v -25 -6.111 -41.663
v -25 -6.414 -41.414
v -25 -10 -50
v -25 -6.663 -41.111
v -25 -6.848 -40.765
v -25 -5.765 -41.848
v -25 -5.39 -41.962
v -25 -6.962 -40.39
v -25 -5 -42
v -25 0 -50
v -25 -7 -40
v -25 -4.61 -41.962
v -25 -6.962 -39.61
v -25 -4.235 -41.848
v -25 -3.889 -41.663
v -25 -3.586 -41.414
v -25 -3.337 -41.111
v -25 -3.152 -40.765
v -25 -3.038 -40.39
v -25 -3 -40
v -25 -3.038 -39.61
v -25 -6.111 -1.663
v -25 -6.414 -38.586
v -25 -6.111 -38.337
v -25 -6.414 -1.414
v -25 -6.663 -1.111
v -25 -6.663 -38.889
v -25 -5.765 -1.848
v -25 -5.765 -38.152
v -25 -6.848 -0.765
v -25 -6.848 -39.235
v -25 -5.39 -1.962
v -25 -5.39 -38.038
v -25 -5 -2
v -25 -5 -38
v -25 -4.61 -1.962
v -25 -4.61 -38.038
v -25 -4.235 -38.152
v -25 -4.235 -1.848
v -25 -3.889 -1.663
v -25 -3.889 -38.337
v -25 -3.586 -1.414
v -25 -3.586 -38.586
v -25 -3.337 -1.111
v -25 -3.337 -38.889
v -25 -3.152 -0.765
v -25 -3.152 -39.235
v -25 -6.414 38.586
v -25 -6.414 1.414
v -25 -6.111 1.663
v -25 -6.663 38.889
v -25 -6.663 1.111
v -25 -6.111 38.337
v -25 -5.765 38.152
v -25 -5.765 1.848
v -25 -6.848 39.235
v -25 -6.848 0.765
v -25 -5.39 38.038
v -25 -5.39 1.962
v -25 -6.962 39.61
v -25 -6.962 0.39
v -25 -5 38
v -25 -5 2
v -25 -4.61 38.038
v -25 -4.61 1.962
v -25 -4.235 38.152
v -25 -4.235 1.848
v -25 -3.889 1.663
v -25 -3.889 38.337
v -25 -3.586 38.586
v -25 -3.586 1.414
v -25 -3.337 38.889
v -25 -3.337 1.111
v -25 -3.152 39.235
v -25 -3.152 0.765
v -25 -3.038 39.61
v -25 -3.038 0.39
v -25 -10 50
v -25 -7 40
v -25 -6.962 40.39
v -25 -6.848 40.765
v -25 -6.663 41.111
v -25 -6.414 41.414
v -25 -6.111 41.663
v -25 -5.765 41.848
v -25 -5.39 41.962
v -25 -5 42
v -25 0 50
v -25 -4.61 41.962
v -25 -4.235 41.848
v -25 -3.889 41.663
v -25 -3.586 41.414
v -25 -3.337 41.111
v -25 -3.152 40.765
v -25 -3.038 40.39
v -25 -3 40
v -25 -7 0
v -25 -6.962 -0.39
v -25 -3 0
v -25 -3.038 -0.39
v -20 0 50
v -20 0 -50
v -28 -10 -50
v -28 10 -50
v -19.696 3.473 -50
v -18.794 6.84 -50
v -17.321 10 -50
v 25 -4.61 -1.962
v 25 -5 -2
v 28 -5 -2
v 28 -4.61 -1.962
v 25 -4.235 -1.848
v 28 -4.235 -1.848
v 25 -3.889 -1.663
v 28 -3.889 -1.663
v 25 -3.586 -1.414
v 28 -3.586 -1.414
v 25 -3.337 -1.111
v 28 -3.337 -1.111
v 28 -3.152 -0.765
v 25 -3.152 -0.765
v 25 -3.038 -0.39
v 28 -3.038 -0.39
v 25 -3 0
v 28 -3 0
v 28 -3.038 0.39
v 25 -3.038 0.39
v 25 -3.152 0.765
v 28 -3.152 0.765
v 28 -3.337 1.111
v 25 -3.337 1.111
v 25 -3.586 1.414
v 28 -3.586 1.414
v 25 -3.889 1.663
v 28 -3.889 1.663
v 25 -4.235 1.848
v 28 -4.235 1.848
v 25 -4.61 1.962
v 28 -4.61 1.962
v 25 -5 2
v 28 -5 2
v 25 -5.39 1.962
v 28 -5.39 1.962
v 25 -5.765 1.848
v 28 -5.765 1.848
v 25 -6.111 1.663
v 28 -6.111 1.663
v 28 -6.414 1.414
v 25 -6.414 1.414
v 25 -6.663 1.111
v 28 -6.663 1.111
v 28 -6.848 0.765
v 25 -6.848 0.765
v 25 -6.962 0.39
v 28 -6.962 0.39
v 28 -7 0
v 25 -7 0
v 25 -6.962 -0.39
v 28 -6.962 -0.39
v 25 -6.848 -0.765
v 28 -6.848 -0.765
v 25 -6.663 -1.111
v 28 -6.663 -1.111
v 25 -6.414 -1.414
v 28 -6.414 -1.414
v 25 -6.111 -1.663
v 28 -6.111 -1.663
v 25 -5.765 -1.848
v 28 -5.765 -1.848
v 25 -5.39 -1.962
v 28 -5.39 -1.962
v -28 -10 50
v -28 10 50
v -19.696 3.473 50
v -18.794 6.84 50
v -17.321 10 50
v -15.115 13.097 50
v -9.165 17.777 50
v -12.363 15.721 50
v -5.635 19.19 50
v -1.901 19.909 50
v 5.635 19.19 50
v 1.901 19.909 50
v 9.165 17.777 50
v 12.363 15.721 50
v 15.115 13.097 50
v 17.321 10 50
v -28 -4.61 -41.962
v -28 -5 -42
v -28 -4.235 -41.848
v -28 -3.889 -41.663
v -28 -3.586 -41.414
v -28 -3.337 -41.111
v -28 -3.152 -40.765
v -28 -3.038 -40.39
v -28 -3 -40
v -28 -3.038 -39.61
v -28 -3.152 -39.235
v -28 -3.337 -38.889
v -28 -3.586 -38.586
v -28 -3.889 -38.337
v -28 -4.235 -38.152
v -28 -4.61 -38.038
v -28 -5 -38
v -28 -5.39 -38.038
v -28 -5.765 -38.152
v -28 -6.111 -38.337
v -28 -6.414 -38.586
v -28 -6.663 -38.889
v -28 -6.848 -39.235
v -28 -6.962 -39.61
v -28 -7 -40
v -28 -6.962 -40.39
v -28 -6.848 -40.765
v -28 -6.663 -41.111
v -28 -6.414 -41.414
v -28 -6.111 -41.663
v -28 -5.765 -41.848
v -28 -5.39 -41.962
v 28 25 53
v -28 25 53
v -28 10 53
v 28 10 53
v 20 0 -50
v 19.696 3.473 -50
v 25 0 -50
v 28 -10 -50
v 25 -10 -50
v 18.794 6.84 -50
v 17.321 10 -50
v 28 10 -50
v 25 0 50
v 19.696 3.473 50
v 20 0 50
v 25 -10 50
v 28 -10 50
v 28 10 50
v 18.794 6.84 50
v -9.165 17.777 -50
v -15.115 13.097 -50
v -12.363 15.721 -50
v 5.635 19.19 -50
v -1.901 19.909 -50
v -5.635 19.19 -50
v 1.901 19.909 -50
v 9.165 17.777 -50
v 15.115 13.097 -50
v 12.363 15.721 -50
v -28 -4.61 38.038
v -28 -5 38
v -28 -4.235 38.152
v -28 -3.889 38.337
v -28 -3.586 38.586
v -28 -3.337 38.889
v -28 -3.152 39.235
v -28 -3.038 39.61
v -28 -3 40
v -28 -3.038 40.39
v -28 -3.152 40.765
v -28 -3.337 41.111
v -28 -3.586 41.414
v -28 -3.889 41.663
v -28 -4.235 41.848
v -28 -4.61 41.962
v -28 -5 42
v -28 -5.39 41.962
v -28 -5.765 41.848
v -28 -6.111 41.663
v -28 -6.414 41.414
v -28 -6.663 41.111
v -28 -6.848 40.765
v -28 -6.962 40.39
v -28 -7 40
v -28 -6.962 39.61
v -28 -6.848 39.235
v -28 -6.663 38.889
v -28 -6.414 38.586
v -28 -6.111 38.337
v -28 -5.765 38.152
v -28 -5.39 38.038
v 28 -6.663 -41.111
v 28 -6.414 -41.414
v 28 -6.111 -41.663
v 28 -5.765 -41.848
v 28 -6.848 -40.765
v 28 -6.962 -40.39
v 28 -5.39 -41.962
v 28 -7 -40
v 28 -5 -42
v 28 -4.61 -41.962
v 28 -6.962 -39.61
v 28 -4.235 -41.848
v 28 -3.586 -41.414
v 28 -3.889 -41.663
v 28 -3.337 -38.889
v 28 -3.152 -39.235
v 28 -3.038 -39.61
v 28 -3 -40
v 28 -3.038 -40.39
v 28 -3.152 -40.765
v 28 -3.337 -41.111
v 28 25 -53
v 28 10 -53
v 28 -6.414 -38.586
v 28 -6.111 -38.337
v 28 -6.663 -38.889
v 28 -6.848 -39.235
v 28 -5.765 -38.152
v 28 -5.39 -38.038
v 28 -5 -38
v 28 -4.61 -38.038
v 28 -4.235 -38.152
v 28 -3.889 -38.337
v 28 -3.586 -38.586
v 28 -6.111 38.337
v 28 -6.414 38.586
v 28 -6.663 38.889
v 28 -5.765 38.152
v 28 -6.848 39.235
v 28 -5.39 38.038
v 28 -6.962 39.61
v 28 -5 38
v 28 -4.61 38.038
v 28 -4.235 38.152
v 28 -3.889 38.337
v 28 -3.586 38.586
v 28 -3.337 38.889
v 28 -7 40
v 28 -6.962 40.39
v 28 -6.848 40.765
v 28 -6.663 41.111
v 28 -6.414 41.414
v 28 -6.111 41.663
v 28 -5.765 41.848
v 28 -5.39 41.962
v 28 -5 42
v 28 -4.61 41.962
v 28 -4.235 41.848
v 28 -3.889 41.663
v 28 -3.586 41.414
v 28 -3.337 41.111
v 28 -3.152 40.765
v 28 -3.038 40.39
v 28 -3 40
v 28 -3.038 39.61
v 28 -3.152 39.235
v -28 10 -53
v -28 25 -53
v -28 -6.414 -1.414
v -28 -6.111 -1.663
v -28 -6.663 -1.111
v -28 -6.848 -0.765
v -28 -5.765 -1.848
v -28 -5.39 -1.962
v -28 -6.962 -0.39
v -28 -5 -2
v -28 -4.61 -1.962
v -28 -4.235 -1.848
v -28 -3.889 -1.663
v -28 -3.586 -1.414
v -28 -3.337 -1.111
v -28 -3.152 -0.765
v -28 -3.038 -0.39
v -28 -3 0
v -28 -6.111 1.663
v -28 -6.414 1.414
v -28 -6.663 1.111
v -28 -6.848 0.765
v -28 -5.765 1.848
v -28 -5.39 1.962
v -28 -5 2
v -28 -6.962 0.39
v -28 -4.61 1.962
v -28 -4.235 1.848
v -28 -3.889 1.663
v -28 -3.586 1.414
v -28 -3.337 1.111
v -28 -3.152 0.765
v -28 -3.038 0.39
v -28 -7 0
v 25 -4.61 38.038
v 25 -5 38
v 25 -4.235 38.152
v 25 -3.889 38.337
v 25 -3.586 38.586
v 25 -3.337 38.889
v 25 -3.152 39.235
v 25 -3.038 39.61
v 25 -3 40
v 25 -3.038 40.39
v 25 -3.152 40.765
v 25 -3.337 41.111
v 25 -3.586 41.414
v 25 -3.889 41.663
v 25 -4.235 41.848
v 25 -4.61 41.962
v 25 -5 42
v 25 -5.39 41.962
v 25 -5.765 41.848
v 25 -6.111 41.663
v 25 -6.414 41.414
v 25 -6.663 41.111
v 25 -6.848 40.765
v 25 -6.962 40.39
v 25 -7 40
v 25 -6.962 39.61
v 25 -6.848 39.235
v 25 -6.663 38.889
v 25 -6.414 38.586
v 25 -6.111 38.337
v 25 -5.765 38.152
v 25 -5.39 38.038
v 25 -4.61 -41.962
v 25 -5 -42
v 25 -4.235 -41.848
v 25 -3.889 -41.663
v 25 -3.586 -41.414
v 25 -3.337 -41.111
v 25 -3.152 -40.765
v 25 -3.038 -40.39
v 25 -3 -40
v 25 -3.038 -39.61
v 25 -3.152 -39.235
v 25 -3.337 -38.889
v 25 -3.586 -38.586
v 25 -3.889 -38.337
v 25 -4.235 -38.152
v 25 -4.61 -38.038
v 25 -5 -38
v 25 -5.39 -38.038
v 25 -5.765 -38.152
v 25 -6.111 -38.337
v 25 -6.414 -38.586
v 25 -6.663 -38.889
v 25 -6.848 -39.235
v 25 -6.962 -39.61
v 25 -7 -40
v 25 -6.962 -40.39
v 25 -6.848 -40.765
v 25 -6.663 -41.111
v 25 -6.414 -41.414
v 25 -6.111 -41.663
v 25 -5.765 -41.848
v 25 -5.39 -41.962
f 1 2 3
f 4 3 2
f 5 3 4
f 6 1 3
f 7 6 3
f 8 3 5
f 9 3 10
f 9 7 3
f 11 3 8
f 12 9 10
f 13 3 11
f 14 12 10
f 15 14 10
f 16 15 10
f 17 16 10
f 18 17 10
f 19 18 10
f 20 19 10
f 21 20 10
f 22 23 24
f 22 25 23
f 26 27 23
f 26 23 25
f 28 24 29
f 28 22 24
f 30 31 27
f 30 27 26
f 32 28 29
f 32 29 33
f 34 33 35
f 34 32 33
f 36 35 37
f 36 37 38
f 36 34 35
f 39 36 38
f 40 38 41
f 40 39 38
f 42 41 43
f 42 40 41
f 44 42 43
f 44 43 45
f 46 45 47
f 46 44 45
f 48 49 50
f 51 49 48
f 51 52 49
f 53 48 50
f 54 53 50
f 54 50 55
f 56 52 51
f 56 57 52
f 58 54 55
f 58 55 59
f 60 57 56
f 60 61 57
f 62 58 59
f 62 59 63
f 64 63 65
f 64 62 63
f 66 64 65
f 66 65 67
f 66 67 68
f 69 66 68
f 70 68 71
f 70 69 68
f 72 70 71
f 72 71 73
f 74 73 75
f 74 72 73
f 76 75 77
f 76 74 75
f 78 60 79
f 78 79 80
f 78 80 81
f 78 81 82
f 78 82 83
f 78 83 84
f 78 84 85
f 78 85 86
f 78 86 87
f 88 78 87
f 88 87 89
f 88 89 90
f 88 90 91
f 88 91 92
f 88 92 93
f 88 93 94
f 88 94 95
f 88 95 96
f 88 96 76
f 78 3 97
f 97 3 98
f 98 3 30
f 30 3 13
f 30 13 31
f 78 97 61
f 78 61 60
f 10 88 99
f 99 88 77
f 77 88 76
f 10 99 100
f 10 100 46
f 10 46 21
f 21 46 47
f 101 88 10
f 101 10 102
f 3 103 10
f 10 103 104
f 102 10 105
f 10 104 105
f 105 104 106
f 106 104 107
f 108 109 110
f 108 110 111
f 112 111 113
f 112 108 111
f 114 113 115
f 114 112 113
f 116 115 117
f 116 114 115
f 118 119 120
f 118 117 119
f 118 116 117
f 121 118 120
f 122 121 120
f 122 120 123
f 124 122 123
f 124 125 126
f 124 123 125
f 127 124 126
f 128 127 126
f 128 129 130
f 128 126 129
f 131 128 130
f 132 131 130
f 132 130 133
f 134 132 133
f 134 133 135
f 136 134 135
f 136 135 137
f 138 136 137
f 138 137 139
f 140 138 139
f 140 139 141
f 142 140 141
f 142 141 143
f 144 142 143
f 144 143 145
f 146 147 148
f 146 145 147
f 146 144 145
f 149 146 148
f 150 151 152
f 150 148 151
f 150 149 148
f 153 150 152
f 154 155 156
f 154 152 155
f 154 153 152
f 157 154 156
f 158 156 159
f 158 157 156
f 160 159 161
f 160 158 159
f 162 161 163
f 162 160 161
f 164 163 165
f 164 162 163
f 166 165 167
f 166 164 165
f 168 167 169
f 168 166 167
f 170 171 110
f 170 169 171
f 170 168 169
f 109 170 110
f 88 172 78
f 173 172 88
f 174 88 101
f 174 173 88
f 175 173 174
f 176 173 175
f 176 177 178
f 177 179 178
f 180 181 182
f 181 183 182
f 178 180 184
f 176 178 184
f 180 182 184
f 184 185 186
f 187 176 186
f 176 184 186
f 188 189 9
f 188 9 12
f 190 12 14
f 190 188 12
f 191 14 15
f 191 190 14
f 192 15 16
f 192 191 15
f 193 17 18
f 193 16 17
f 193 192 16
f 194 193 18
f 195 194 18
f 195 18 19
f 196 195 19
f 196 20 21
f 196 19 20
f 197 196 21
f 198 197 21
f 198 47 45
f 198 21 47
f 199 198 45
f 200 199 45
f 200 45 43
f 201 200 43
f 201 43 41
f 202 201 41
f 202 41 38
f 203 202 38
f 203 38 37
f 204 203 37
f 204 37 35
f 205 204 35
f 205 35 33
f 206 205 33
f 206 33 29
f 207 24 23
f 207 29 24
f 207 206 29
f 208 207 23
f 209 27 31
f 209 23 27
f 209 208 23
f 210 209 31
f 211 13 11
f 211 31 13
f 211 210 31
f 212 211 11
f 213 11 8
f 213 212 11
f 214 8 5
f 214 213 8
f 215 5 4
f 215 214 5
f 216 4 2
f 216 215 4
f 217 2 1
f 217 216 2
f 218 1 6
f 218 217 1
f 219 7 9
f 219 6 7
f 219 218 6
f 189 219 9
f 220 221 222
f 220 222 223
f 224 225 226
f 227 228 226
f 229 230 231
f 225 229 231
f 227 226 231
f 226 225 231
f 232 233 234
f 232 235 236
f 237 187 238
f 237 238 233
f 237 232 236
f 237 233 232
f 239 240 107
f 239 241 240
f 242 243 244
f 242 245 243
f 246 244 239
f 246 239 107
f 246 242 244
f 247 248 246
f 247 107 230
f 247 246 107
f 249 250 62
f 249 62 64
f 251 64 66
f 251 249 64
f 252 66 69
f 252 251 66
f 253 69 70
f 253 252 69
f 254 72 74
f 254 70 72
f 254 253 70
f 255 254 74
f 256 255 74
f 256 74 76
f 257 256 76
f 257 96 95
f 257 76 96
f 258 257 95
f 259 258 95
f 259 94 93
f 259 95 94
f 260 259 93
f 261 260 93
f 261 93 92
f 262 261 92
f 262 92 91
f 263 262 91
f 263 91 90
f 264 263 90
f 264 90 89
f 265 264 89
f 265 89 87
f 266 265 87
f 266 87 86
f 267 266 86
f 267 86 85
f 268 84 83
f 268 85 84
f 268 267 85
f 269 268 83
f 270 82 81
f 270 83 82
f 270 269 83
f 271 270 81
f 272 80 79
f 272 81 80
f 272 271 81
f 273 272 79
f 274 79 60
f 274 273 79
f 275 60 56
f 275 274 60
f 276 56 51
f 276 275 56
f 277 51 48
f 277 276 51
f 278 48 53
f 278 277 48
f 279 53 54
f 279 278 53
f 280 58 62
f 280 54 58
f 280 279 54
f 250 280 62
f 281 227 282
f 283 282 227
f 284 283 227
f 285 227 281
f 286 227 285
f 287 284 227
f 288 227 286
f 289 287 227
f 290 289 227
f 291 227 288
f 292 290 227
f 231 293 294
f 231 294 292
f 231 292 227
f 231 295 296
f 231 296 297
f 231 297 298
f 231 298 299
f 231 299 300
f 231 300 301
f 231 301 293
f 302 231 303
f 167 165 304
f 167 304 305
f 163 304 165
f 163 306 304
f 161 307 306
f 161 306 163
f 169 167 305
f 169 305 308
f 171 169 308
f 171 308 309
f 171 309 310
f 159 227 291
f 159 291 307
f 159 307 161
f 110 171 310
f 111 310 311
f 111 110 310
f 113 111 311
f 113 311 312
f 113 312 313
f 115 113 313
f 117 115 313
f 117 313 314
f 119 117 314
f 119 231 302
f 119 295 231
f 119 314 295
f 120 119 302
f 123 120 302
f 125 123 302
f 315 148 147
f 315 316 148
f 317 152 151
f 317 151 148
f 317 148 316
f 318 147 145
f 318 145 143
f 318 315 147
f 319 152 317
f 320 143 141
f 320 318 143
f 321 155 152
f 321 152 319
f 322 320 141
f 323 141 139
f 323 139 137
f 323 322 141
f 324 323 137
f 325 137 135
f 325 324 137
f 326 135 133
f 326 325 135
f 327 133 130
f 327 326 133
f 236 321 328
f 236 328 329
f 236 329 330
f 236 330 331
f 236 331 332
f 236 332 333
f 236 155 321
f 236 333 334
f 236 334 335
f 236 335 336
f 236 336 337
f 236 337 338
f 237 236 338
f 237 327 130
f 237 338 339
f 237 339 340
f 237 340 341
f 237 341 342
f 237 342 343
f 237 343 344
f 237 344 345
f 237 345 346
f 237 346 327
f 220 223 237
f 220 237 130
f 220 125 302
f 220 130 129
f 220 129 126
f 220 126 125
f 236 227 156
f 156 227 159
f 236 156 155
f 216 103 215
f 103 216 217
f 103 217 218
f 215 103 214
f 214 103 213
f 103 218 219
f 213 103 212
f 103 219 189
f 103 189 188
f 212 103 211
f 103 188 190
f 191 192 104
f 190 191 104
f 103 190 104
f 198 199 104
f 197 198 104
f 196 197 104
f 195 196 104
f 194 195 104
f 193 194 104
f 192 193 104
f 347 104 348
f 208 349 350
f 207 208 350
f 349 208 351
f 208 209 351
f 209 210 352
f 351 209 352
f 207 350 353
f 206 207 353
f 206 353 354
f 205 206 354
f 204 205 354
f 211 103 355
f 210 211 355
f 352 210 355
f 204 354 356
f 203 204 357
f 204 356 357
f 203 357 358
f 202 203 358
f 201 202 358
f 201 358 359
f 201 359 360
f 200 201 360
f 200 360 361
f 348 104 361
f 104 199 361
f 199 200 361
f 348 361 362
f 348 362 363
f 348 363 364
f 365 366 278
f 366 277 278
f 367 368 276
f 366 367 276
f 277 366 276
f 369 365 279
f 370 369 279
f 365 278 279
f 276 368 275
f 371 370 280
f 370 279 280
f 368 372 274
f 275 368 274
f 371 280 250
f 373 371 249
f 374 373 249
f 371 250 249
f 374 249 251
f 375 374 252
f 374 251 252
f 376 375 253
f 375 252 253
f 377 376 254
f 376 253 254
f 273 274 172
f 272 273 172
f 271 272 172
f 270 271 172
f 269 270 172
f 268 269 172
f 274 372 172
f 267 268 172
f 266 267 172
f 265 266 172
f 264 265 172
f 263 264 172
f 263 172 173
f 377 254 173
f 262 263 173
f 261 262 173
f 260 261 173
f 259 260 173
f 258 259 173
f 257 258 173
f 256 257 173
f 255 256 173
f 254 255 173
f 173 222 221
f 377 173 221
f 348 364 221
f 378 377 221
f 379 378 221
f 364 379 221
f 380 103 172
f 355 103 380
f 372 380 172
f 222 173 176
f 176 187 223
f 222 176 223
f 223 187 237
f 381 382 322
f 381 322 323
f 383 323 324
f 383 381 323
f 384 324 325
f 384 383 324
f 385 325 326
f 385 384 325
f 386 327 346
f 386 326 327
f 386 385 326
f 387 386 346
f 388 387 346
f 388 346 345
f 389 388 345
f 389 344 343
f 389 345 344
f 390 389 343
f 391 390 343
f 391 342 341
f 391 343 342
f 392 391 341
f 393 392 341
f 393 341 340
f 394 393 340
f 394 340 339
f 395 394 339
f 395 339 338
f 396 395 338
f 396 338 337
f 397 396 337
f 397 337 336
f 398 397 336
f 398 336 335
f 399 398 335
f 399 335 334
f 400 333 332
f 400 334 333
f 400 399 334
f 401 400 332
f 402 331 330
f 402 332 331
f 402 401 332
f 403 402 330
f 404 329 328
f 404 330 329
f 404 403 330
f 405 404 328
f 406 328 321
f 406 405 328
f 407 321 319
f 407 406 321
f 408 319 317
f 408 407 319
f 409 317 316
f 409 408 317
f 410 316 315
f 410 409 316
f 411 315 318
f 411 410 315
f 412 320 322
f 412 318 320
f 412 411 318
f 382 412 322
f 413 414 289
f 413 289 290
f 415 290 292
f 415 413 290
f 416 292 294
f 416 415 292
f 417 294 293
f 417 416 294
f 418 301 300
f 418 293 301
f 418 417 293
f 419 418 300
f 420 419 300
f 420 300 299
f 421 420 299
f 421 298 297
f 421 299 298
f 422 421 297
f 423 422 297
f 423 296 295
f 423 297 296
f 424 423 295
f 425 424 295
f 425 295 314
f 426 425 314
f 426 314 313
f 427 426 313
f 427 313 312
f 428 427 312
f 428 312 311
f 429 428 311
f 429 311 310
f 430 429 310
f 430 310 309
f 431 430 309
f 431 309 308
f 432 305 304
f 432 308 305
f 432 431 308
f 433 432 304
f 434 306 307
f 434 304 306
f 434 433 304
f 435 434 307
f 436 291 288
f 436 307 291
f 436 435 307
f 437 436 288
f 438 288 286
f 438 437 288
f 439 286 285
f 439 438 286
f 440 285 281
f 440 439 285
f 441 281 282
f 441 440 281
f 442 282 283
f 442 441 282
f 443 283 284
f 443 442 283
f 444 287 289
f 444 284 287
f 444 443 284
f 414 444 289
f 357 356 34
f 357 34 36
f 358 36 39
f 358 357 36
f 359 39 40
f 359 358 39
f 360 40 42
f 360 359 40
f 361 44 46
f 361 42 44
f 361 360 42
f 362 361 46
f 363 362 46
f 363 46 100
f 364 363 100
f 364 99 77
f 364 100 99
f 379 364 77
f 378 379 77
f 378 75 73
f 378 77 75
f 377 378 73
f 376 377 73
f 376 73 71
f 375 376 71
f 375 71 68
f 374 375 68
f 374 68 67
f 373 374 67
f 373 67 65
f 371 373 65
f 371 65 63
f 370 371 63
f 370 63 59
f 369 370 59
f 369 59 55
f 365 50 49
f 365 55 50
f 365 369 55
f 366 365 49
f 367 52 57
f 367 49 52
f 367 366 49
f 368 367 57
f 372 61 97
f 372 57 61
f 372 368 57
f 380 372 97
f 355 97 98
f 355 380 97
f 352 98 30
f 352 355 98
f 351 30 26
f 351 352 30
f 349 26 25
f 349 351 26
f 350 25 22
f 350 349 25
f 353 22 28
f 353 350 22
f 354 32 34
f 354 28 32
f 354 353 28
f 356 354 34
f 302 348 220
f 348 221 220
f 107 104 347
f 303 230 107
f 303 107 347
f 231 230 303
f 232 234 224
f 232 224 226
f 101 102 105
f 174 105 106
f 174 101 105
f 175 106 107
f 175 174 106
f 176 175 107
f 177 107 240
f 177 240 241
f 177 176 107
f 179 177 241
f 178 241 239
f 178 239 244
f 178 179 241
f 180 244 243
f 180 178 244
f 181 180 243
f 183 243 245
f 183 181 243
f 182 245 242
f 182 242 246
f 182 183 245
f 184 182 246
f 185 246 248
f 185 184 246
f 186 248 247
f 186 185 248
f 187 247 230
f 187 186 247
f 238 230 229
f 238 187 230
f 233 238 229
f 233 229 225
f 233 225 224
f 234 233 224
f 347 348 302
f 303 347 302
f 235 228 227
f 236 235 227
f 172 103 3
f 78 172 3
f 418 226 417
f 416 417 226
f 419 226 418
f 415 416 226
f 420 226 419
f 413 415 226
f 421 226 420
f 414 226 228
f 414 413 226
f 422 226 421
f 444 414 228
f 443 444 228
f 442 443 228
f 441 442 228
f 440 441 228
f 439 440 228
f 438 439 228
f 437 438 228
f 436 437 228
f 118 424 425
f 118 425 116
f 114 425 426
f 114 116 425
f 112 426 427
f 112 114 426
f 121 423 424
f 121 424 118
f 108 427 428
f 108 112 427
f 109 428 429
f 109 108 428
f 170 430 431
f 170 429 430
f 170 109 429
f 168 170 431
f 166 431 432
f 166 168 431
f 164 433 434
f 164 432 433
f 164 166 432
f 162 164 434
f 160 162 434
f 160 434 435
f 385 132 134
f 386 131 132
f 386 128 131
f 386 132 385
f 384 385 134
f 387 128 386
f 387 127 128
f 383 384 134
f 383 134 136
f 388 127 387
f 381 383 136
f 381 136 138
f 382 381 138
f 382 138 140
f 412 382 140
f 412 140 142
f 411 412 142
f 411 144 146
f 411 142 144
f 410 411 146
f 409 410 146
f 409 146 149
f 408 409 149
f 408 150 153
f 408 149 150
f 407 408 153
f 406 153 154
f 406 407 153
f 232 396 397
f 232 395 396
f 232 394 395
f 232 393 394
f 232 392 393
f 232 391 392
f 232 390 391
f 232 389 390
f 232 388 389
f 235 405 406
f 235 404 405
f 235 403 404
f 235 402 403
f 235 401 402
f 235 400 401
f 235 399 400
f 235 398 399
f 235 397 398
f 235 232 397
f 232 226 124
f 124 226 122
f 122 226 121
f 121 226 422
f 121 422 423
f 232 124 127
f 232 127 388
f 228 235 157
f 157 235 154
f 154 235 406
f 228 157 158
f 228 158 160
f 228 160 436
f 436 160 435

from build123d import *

# Parameters (mm, degrees)
BOSS_EXTRUDE1_DEPTH     = 50
CUT_EXTRUDE1_DEPTH      = 100
CUT_EXTRUDE1_DEPTH_BACK = 100
SKETCH2_R               = 2
SKETCH3_W               = 56
SKETCH3_H               = 15
BOSS_EXTRUDE2_DEPTH     = 3


with BuildPart() as part:
    # Sketch1 → Boss-Extrude1 (new, symmetric)
    with BuildSketch(Plane.XY):
        with BuildLine():
            Line((-28, 25), (-28, -10))
            Line((-28, -10), (-25, -10))
            Line((-25, -10), (-25, 0))
            Line((-25, 0), (-20, 0))
            ThreePointArc((-20, 0), (0, 20), (20, 0))
            Line((20, 0), (25, 0))
            Line((25, 0), (25, -10))
            Line((25, -10), (28, -10))
            Line((28, -10), (28, 25))
            Line((28, 25), (-28, 25))
        make_face()
    extrude(amount=BOSS_EXTRUDE1_DEPTH, both=True)

    # Sketch2 → Cut-Extrude1 (cut, two sides: drawn at the far end of the back side and taken through both)
    with BuildSketch(Plane(origin=(-25, 0, 0), x_dir=(0, 0, -1), z_dir=(1, 0, 0)).offset(-CUT_EXTRUDE1_DEPTH_BACK)):
        with Locations((-40, -5)):
            Circle(SKETCH2_R)
        with Locations((0, -5)):
            Circle(SKETCH2_R)
        with Locations((40, -5)):
            Circle(SKETCH2_R)
    extrude(amount=CUT_EXTRUDE1_DEPTH + CUT_EXTRUDE1_DEPTH_BACK, mode=Mode.SUBTRACT)

    # Sketch3 → Boss-Extrude2 (add)
    with BuildSketch(Plane.XY.offset(50)):
        with Locations((0, 17.5)):
            Rectangle(SKETCH3_W, SKETCH3_H)
    boss_extrude2 = extrude(amount=BOSS_EXTRUDE2_DEPTH)

    # Mirror1: Boss-Extrude2 across plane
    add(boss_extrude2.mirror(Plane.XY))


solid = part.part
